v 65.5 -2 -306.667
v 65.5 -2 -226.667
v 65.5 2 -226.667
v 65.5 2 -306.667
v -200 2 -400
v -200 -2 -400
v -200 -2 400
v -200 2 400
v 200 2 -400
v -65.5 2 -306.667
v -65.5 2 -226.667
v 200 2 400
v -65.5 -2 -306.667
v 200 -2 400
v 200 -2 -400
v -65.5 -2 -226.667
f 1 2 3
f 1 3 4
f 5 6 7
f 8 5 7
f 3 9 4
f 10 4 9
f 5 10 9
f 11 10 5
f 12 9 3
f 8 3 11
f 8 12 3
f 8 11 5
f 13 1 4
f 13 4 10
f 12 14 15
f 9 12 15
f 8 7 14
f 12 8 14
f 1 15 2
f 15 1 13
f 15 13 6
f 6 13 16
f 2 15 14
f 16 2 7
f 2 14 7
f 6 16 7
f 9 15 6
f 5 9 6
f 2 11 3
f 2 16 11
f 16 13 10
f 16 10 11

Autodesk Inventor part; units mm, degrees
ref_plane "YZ Plane" through (0, 0, 0) normal (1, 0, 0) x (0, 1, 0)
ref_plane "XZ Plane" through (0, 0, 0) normal (0, 1, 0) x (-1, 0, 0)
ref_plane "XY Plane" through (0, 0, 0) normal (0, 0, 1) x (1, 0, 0)
sketch "Sketch1" plane through (0, 0, 0) normal (0, 1, 0) x (-1, 0, 0)
  line L0 (200, 400) -> (-200, 400)
  line L1 (-200, 400) -> (-200, -400)
  line L2 (-200, -400) -> (200, -400)
  line L3 (200, -400) -> (200, 400)
  line L4 (65.5, -226.6667) -> (-65.5, -226.6667)
  line L5 (-65.5, -226.6667) -> (-65.5, -306.6667)
  line L6 (-65.5, -306.6667) -> (65.5, -306.6667)
  line L7 (65.5, -306.6667) -> (65.5, -226.6667)
  point P0 (0, 0)
  dimension "d0" = 800
  dimension "d1" = 400
  dimension "d3" = 200
  dimension "d4" = 400
  dimension "d5" = 80
  dimension "d6" = 131
  dimension "d7" = 134.5
  dimension "d8" = 93.3333
sketch "Sketch2" plane through (0, 0, 0) normal (0, 1, 0) x (-1, 0, 0)
  point P0 (0, 0)
sketch "Sketch3" plane through (0, 0, 0) normal (1, 0, 0) x (0, 1, 0)
  point P0 (0, 0)
sketch "Sketch4" plane through (0, 0, 0) normal (0, 1, 0) x (-1, 0, 0)
  point P0 (0, 0)
  point P1 (0, 0)
sketch "Sketch5" plane through (0, 0, 0) normal (0, 1, 0) x (-1, 0, 0)
  point P0 (0, 0)
extrude "Extrusion1" add sketch "Sketch1" along normal mid plane 4
equation "\"d7\" = 0.5 * d1 - 0.5 * d6"
equation "\"d8\" = 0.166667 * d0 - 0.5 * d5"
properties part number "front"
